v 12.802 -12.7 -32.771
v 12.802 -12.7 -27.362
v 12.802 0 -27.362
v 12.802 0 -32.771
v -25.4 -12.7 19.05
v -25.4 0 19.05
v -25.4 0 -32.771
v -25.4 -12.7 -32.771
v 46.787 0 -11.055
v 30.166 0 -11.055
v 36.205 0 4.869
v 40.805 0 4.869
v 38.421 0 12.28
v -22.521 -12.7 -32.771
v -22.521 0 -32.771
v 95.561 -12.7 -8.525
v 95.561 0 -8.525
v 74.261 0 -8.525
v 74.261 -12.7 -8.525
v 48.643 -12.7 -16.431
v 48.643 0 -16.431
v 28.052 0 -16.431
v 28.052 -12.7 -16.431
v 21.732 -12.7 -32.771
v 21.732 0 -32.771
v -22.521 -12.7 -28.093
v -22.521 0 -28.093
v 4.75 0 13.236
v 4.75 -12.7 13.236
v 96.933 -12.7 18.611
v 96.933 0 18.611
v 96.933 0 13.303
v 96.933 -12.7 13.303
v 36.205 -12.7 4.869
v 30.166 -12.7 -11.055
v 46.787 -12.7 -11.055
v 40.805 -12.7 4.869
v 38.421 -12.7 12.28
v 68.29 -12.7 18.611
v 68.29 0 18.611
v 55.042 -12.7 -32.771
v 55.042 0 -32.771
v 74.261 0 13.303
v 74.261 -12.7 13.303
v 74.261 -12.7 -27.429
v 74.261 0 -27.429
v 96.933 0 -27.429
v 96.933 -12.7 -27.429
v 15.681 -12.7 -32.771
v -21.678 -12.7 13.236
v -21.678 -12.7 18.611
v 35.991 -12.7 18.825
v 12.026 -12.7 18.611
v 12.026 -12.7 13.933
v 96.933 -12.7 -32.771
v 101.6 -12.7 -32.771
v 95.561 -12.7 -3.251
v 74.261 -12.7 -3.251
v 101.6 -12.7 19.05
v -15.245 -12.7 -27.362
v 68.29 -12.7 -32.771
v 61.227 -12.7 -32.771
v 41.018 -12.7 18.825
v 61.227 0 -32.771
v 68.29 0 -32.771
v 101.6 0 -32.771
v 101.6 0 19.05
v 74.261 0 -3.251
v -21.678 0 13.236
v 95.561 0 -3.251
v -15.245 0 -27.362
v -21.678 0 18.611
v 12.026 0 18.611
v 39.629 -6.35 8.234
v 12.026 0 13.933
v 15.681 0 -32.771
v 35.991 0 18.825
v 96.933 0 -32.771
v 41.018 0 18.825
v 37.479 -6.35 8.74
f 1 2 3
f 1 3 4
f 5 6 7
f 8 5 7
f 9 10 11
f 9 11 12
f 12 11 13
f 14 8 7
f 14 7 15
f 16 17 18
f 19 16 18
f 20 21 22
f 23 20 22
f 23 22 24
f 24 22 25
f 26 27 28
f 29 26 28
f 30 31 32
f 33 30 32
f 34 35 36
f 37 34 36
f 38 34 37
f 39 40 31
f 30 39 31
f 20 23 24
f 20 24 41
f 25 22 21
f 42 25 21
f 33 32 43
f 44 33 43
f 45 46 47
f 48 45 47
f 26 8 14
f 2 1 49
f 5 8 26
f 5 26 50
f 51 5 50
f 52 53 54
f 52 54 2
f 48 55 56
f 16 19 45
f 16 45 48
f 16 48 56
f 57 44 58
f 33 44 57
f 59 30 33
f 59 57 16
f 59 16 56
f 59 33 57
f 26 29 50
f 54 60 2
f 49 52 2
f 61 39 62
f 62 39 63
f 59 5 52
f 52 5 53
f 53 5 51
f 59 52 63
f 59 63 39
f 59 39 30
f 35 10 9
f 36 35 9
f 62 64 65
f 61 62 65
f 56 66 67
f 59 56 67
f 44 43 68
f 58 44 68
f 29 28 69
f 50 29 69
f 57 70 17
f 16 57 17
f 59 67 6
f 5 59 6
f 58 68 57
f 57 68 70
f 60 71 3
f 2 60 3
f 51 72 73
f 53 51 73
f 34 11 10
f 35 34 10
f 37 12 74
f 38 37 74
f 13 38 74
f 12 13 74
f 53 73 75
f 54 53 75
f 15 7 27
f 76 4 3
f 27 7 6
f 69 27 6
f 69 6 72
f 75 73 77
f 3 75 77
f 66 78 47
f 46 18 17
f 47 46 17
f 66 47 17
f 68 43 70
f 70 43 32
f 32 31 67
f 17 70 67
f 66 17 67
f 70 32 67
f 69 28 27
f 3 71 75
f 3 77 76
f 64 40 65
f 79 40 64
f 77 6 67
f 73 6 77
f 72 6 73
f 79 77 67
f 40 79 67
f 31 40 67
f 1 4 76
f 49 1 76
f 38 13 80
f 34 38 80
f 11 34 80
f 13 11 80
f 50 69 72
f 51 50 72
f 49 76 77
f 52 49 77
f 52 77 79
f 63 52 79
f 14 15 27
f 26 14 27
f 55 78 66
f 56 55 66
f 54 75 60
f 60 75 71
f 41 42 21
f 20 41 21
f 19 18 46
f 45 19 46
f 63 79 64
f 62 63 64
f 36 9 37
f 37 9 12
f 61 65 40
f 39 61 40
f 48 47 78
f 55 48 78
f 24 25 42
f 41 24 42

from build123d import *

# Parameters (mm, degrees)
F1_DEPTH = 12.7


with BuildPart() as f1:
    # F0 (on Front) → F1 (new body)
    with BuildSketch(Plane.XZ):
        Polygon((-25.4, 19.05), (-25.4, -32.7711281325), (-22.5210484371, -32.7711281325), (-22.5210484371, -28.0928318427), (4.7502700788, 13.2358673515), (-21.6776055964, 13.2358673515), (-21.6776055964, 18.6114097228), (12.0263703179, 18.6114097228), (12.0263703179, 13.9331134331), (-15.244948198, -27.3618480475), (12.8023377313, -27.3618480475), (12.8023377313, -32.7711281325), (15.6812892943, -32.7711281325), (35.9913928983, 18.8250819091), (41.0183122288, 18.8250819091), (61.2272026919, -32.7711281325), (68.2896307447, -32.7711281325), (68.2896307447, 18.6114097228), (96.9329496148, 18.6114097228), (96.9329496148, 13.3033427787), (74.2612060568, 13.3033427787), (74.2612060568, -3.250628708), (95.5609492606, -3.250628708), (95.5609492606, -8.5249579385), (74.2612060568, -8.5249579385), (74.2612060568, -27.4293234747), (96.9329496148, -27.4293234747), (96.9329496148, -32.7711281325), (101.6, -32.7711281325), (101.6, 19.05), align=None)
    extrude(amount=F1_DEPTH)


with BuildPart() as f1b:
    # F0 (on Front) → F1, piece 2 (new body)
    with BuildSketch(Plane.XZ):
        Polygon((28.0517842912, -16.430828832), (21.7315859382, -32.7711281325), (55.0419551935, -32.7711281325), (48.6430355087, -16.430828832), align=None)
    extrude(amount=F1_DEPTH)


with BuildPart() as f1c:
    # F0 (on Front) → F1, piece 3 (new body)
    with BuildSketch(Plane.XZ):
        with BuildLine():
            Line((30.1660143452, -11.0552864606), (46.7874612592, -11.0552864606))
            Line((46.7874612592, -11.0552864606), (40.8046400425, 4.8689143717))
            add(Edge.make_bspline(
                [(40.8046400425, 4.8689143717), (39.6463118746, 7.8940626937), (38.4205082795, 12.2799654653)],
                knots=[0, 0, 0, 1, 1, 1], degree=2))
            add(Edge.make_bspline(
                [(38.4205082795, 12.2799654653), (37.644540866, 8.9061941025), (36.2050650846, 4.8689143717)],
                knots=[0, 0, 0, 1, 1, 1], degree=2))
            Line((36.2050650846, 4.8689143717), (30.1660143452, -11.0552864606))
        make_face()
    extrude(amount=F1_DEPTH)


solid = Compound([f1.part, f1b.part, f1c.part])
